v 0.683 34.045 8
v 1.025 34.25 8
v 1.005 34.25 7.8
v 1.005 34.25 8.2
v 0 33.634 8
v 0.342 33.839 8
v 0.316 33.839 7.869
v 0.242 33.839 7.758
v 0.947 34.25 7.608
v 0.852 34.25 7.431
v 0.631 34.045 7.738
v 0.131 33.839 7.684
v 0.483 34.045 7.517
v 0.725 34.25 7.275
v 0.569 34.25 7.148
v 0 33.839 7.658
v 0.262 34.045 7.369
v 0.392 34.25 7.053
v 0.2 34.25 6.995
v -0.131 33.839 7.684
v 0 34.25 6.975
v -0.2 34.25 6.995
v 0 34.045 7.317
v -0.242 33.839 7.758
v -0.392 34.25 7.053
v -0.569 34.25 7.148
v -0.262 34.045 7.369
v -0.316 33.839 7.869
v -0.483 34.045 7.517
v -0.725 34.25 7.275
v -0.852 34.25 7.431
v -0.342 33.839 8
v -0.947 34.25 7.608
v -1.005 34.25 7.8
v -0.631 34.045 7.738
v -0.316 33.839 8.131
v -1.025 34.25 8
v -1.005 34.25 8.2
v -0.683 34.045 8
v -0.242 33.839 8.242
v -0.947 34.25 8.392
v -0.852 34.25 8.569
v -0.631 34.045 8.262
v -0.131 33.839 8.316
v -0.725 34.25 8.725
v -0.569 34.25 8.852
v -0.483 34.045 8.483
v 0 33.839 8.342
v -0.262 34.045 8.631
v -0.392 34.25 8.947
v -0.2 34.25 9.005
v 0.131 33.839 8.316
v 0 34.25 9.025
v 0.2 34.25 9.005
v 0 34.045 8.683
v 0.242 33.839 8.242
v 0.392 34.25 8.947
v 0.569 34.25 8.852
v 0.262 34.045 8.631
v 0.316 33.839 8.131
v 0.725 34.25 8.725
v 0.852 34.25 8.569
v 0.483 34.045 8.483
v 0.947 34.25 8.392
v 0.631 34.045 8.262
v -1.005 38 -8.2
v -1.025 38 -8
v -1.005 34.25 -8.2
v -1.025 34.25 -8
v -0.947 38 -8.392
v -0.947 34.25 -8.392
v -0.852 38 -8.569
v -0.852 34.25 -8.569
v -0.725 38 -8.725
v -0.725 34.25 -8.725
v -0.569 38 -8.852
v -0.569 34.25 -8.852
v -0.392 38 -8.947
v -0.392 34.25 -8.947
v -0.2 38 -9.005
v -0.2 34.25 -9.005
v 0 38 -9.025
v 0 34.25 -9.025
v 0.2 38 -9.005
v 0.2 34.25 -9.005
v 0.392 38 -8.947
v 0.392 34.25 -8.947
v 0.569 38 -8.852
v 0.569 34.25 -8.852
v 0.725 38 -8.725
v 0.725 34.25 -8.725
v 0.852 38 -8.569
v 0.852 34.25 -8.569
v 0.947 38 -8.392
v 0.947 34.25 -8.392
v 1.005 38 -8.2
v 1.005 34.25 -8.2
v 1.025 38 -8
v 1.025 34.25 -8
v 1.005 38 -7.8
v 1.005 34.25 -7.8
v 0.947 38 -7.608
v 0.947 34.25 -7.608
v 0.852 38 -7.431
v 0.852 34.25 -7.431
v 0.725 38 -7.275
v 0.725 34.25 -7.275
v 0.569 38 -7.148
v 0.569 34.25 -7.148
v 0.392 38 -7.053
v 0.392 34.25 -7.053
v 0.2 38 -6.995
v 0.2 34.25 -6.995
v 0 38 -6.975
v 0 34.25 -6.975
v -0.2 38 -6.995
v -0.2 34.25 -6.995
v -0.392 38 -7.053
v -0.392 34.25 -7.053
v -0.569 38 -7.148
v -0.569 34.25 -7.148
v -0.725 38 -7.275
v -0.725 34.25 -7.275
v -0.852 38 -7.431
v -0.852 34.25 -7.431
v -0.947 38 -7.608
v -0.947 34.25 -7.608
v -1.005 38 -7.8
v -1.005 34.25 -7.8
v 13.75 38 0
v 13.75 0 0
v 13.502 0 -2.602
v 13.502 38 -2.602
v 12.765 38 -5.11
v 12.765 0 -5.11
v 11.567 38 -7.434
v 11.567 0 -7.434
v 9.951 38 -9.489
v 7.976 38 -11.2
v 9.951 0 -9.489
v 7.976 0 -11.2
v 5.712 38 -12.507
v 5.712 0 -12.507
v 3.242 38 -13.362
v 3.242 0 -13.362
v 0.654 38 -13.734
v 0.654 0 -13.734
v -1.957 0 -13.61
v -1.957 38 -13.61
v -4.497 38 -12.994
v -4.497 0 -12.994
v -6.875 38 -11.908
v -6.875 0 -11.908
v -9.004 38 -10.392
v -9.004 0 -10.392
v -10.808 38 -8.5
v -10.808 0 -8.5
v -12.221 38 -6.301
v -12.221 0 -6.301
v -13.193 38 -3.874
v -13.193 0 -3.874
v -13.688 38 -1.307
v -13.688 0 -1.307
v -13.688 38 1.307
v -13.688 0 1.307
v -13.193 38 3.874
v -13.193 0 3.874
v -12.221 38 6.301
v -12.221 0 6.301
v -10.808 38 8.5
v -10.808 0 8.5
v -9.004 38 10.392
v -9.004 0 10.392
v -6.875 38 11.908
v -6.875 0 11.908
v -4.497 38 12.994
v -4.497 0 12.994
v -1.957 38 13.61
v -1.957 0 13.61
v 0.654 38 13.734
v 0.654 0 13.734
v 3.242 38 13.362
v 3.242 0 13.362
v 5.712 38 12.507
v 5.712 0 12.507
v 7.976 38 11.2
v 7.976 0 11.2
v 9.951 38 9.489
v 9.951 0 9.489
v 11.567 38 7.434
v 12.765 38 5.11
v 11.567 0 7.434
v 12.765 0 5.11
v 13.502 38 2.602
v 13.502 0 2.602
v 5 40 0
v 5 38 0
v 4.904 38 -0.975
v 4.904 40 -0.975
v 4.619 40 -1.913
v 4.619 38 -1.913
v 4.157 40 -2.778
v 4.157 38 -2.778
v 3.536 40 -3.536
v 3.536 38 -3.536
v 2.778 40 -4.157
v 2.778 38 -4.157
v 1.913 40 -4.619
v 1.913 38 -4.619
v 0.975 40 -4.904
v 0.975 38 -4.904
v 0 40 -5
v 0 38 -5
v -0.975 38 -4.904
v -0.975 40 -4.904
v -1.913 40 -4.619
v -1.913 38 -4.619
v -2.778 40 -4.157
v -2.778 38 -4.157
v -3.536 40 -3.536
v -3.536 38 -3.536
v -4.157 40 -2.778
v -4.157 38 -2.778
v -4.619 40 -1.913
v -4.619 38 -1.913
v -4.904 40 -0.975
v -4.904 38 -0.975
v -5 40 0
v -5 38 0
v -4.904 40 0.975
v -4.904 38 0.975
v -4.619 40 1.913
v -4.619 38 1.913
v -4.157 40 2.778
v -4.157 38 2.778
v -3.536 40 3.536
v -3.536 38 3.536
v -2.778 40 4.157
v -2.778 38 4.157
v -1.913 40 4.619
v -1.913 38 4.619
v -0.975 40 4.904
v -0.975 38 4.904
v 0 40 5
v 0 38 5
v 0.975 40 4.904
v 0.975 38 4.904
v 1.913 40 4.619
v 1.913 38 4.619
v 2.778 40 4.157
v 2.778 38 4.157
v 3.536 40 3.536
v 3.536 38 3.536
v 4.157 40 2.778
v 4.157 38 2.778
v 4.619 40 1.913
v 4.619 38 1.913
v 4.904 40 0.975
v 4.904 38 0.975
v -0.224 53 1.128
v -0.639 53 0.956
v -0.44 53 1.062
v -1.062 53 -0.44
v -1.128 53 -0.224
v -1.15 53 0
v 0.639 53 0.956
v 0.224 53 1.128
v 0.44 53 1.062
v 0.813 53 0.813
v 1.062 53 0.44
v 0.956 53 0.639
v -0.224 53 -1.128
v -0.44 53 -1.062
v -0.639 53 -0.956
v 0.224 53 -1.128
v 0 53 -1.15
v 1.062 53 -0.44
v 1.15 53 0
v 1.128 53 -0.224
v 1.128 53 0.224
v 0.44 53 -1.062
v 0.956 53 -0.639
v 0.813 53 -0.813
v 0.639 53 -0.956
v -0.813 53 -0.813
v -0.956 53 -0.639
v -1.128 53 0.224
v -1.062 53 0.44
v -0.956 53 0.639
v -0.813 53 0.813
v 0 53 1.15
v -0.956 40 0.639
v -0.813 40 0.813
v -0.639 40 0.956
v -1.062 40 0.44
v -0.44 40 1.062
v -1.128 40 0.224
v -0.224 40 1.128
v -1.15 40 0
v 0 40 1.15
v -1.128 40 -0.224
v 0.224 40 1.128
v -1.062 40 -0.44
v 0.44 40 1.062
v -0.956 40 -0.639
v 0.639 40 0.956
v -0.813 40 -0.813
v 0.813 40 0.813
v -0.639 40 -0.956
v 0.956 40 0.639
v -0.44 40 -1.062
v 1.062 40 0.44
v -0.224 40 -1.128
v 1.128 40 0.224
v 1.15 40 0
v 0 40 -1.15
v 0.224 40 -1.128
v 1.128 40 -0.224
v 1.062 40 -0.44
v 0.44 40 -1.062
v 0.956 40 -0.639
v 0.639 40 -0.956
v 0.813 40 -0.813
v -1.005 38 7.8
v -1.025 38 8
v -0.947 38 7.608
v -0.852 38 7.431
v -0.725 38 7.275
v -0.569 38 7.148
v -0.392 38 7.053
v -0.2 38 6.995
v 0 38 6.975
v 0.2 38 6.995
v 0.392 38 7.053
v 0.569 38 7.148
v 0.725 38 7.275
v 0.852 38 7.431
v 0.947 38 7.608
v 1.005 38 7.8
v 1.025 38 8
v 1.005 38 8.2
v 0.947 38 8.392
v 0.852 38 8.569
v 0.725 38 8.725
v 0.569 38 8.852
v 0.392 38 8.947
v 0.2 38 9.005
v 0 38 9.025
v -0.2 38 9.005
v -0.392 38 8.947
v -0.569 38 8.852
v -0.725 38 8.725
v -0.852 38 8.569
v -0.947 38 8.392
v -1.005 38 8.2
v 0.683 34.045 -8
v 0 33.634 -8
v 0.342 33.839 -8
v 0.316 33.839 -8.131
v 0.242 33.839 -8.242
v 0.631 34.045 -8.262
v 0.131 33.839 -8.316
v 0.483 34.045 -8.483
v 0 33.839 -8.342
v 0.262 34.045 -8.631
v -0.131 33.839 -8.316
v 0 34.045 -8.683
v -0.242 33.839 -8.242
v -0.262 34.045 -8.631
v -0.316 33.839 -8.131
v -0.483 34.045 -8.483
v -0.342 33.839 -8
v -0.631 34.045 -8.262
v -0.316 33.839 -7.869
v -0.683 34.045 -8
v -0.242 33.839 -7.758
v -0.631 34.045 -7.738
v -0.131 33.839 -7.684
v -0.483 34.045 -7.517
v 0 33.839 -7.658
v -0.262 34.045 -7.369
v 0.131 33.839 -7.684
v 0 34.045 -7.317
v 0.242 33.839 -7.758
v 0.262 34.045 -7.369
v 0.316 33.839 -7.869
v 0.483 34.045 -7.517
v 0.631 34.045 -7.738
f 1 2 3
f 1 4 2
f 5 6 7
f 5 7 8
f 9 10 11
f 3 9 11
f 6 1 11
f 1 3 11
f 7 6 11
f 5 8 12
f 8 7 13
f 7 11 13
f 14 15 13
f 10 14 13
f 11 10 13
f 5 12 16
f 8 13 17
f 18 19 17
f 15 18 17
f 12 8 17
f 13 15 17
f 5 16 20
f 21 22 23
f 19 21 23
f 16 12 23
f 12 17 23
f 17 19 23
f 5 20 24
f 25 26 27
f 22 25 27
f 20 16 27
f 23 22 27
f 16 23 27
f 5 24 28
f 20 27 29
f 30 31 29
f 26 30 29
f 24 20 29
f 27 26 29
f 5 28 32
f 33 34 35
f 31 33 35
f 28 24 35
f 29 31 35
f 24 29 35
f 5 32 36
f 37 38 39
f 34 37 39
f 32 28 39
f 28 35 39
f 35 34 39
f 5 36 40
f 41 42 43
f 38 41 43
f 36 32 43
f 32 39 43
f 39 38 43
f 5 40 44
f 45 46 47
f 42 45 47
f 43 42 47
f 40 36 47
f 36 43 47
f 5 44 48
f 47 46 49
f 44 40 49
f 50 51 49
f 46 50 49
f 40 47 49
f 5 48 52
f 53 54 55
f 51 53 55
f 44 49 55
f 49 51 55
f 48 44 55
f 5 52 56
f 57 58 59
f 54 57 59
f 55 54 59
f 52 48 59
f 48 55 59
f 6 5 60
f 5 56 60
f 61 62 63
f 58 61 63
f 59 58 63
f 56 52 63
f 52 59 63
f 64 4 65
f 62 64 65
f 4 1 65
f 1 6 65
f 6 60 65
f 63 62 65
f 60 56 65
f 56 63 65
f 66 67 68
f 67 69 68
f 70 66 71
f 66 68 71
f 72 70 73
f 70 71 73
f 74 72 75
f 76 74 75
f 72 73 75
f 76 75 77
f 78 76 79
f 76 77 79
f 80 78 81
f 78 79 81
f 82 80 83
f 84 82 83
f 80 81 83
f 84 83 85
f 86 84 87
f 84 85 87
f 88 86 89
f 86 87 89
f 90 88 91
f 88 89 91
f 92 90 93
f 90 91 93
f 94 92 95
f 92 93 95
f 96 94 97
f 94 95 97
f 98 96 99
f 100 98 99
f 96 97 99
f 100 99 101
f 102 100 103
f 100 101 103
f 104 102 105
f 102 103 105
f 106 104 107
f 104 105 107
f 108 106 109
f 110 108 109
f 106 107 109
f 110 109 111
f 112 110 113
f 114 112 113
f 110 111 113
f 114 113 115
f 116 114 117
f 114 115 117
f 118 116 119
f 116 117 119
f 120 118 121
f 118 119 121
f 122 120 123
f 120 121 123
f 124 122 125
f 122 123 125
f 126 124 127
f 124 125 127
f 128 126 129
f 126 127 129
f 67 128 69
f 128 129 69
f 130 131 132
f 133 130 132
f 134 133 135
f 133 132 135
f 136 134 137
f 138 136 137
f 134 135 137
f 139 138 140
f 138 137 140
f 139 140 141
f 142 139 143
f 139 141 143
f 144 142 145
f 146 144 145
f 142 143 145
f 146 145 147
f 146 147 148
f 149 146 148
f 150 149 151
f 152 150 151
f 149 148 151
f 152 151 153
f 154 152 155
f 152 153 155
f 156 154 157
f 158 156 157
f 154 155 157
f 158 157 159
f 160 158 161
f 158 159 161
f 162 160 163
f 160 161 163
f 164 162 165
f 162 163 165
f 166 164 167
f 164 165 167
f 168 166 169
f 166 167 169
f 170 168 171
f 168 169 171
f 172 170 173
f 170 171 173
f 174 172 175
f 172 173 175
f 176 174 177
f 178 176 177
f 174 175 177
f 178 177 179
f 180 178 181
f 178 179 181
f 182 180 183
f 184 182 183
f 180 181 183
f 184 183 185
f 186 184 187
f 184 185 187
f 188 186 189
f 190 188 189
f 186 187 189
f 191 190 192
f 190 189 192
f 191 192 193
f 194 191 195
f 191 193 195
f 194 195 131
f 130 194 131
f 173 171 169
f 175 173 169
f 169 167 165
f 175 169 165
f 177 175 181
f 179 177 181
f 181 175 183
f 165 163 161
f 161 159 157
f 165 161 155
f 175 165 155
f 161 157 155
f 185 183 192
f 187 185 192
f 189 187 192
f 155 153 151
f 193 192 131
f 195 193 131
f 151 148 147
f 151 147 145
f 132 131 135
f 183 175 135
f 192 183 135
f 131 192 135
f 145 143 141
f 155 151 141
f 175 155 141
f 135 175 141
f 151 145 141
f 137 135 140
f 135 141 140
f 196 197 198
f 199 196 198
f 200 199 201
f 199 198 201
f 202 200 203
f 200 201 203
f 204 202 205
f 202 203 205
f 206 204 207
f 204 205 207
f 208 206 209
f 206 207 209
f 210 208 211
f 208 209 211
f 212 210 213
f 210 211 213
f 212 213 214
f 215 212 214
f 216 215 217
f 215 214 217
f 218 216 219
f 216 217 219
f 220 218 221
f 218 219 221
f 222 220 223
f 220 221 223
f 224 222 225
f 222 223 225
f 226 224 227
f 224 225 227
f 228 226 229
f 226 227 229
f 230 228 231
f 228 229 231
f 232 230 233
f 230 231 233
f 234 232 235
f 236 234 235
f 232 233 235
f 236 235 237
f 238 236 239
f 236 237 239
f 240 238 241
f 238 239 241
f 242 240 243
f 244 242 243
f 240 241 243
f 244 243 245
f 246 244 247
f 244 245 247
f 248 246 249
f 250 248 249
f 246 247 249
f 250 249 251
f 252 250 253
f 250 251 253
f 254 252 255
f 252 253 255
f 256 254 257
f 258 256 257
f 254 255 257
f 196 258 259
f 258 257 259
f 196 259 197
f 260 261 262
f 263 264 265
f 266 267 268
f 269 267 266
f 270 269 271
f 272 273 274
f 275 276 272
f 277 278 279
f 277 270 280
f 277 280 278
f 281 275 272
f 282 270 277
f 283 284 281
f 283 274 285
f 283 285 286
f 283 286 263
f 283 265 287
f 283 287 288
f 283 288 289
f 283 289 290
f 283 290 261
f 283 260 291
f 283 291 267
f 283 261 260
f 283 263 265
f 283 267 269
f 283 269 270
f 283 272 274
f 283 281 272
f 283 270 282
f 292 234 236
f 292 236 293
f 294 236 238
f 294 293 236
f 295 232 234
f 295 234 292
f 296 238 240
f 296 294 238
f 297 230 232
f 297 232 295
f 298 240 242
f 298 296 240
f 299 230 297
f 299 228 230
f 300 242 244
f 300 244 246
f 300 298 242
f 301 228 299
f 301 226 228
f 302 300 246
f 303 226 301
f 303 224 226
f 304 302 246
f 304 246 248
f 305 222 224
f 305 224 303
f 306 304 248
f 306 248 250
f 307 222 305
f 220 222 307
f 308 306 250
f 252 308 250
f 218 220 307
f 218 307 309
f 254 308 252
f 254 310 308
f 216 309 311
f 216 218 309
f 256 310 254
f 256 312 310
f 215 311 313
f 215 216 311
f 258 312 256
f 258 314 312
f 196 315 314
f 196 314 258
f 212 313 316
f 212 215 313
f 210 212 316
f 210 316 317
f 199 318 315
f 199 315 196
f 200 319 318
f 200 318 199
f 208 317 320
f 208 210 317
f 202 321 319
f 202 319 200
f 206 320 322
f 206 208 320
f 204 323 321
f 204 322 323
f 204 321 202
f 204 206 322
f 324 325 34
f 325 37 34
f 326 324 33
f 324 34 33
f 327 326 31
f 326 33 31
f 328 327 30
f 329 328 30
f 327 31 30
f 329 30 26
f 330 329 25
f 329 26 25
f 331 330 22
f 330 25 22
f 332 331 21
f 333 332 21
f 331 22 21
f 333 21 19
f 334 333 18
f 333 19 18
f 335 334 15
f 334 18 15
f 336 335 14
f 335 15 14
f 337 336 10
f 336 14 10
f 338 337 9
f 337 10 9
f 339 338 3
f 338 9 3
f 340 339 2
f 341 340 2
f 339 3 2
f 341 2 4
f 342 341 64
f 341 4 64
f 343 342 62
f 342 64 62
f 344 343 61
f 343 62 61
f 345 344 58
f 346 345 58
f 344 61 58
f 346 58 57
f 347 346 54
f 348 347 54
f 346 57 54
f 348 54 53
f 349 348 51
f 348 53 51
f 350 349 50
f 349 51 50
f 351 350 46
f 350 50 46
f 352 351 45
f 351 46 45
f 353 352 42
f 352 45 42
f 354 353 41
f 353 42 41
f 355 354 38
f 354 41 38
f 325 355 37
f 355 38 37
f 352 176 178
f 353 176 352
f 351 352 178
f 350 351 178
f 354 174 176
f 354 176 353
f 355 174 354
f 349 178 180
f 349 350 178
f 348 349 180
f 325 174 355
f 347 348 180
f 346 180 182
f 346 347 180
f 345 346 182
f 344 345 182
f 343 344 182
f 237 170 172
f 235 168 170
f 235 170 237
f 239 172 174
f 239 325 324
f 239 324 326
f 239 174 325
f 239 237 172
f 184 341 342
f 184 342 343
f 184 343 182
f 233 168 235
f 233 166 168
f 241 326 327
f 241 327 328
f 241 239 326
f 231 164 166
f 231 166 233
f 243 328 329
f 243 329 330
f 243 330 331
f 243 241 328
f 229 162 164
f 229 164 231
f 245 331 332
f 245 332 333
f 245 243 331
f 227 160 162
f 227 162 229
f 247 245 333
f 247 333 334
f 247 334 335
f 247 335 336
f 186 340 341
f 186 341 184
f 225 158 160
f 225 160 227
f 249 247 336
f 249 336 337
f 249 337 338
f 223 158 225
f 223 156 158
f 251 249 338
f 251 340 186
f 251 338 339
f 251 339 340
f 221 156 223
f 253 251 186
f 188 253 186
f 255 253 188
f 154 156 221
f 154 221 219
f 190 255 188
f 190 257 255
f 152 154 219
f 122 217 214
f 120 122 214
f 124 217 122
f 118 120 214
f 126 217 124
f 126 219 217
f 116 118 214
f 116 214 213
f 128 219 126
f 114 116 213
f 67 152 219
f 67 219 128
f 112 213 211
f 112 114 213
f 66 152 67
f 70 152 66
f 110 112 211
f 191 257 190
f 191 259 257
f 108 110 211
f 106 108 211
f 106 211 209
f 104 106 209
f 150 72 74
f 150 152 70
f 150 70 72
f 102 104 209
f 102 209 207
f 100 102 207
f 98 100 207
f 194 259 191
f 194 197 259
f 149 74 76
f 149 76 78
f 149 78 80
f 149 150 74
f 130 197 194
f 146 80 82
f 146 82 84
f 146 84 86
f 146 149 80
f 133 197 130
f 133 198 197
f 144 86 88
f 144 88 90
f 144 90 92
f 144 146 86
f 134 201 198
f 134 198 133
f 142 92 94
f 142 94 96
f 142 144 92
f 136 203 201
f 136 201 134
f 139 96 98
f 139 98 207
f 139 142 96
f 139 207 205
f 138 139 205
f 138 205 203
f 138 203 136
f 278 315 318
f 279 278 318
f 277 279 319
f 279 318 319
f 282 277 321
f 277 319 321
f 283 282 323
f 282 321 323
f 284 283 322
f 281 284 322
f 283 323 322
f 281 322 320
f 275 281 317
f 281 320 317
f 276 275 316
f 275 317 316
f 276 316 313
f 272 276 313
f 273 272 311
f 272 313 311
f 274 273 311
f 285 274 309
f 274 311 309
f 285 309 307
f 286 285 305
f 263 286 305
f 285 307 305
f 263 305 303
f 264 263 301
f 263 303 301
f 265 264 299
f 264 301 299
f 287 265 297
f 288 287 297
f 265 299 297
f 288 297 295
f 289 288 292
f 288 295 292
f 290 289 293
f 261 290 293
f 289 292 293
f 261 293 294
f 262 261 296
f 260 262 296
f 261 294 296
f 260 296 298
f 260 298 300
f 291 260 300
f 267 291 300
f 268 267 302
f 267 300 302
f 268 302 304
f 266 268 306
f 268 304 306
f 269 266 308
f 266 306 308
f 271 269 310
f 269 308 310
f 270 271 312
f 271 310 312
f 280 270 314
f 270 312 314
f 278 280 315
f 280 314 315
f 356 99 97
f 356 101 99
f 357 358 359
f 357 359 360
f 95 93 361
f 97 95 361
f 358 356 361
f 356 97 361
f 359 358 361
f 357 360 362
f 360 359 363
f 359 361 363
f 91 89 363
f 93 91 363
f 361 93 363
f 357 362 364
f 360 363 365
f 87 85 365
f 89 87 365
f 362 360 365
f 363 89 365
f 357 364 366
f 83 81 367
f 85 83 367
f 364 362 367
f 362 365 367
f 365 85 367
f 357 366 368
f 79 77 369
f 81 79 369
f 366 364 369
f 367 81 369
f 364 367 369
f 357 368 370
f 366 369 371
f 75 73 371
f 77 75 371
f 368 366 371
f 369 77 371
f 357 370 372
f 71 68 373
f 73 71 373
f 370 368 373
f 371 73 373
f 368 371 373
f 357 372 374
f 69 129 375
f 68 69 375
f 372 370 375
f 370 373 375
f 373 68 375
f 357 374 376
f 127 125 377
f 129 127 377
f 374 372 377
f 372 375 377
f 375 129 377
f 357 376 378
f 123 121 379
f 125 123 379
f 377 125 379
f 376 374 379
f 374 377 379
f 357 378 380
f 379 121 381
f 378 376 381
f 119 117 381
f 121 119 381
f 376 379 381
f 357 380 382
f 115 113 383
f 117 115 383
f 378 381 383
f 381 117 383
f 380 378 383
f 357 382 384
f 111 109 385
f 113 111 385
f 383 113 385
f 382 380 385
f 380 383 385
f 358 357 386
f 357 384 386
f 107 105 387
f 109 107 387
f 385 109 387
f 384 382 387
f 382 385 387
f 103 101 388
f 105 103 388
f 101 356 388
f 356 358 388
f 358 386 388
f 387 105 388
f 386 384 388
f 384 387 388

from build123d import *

# Parameters (mm, degrees)
SKETCH_1_R               = 13.75
EXTRUDE_1_DEPTH          = 38
SKETCH_2_R               = 5
EXTRUDE_2_DEPTH          = 2
SKETCH_3_R               = 1.15
EXTRUDE_3_DEPTH          = 13
HOLE_WIZARD_M2_5_1_D     = 2.05
HOLE_WIZARD_M2_5_1_DEPTH = 3.75
HOLE_WIZARD_M2_5_1_TIP   = 0.615882135


with BuildPart() as part:
    # 草图1 → 凸台-拉伸1 (new body)
    with BuildSketch(Plane(origin=(0, 0, 0), x_dir=(1, 0, 0), z_dir=(0, 1, 0))):
        Circle(SKETCH_1_R)
    extrude(amount=EXTRUDE_1_DEPTH)

    # 草图2 → 凸台-拉伸2 (add)
    with BuildSketch(Plane(origin=(0, 38, 0), x_dir=(1, 0, 0), z_dir=(0, 1, 0))):
        Circle(SKETCH_2_R)
    extrude(amount=EXTRUDE_2_DEPTH)

    # 草图3 → 凸台-拉伸3 (add)
    with BuildSketch(Plane(origin=(0, 40, 0), x_dir=(1, 0, 0), z_dir=(0, 1, 0))):
        Circle(SKETCH_3_R)
    extrude(amount=EXTRUDE_3_DEPTH)

    # M2.5 螺纹孔1
    with Locations(Plane(origin=(0, 38, 0), x_dir=(1, 0, 0), z_dir=(0, 1, 0))):
        with Locations((0, 8), (0, -8)):
            Hole(HOLE_WIZARD_M2_5_1_D / 2, depth=HOLE_WIZARD_M2_5_1_DEPTH)
            with Locations((0, 0, -(HOLE_WIZARD_M2_5_1_DEPTH + HOLE_WIZARD_M2_5_1_TIP / 2))):  # 118° drill point
                Cone(0, HOLE_WIZARD_M2_5_1_D / 2, HOLE_WIZARD_M2_5_1_TIP, mode=Mode.SUBTRACT)


solid = part.part
